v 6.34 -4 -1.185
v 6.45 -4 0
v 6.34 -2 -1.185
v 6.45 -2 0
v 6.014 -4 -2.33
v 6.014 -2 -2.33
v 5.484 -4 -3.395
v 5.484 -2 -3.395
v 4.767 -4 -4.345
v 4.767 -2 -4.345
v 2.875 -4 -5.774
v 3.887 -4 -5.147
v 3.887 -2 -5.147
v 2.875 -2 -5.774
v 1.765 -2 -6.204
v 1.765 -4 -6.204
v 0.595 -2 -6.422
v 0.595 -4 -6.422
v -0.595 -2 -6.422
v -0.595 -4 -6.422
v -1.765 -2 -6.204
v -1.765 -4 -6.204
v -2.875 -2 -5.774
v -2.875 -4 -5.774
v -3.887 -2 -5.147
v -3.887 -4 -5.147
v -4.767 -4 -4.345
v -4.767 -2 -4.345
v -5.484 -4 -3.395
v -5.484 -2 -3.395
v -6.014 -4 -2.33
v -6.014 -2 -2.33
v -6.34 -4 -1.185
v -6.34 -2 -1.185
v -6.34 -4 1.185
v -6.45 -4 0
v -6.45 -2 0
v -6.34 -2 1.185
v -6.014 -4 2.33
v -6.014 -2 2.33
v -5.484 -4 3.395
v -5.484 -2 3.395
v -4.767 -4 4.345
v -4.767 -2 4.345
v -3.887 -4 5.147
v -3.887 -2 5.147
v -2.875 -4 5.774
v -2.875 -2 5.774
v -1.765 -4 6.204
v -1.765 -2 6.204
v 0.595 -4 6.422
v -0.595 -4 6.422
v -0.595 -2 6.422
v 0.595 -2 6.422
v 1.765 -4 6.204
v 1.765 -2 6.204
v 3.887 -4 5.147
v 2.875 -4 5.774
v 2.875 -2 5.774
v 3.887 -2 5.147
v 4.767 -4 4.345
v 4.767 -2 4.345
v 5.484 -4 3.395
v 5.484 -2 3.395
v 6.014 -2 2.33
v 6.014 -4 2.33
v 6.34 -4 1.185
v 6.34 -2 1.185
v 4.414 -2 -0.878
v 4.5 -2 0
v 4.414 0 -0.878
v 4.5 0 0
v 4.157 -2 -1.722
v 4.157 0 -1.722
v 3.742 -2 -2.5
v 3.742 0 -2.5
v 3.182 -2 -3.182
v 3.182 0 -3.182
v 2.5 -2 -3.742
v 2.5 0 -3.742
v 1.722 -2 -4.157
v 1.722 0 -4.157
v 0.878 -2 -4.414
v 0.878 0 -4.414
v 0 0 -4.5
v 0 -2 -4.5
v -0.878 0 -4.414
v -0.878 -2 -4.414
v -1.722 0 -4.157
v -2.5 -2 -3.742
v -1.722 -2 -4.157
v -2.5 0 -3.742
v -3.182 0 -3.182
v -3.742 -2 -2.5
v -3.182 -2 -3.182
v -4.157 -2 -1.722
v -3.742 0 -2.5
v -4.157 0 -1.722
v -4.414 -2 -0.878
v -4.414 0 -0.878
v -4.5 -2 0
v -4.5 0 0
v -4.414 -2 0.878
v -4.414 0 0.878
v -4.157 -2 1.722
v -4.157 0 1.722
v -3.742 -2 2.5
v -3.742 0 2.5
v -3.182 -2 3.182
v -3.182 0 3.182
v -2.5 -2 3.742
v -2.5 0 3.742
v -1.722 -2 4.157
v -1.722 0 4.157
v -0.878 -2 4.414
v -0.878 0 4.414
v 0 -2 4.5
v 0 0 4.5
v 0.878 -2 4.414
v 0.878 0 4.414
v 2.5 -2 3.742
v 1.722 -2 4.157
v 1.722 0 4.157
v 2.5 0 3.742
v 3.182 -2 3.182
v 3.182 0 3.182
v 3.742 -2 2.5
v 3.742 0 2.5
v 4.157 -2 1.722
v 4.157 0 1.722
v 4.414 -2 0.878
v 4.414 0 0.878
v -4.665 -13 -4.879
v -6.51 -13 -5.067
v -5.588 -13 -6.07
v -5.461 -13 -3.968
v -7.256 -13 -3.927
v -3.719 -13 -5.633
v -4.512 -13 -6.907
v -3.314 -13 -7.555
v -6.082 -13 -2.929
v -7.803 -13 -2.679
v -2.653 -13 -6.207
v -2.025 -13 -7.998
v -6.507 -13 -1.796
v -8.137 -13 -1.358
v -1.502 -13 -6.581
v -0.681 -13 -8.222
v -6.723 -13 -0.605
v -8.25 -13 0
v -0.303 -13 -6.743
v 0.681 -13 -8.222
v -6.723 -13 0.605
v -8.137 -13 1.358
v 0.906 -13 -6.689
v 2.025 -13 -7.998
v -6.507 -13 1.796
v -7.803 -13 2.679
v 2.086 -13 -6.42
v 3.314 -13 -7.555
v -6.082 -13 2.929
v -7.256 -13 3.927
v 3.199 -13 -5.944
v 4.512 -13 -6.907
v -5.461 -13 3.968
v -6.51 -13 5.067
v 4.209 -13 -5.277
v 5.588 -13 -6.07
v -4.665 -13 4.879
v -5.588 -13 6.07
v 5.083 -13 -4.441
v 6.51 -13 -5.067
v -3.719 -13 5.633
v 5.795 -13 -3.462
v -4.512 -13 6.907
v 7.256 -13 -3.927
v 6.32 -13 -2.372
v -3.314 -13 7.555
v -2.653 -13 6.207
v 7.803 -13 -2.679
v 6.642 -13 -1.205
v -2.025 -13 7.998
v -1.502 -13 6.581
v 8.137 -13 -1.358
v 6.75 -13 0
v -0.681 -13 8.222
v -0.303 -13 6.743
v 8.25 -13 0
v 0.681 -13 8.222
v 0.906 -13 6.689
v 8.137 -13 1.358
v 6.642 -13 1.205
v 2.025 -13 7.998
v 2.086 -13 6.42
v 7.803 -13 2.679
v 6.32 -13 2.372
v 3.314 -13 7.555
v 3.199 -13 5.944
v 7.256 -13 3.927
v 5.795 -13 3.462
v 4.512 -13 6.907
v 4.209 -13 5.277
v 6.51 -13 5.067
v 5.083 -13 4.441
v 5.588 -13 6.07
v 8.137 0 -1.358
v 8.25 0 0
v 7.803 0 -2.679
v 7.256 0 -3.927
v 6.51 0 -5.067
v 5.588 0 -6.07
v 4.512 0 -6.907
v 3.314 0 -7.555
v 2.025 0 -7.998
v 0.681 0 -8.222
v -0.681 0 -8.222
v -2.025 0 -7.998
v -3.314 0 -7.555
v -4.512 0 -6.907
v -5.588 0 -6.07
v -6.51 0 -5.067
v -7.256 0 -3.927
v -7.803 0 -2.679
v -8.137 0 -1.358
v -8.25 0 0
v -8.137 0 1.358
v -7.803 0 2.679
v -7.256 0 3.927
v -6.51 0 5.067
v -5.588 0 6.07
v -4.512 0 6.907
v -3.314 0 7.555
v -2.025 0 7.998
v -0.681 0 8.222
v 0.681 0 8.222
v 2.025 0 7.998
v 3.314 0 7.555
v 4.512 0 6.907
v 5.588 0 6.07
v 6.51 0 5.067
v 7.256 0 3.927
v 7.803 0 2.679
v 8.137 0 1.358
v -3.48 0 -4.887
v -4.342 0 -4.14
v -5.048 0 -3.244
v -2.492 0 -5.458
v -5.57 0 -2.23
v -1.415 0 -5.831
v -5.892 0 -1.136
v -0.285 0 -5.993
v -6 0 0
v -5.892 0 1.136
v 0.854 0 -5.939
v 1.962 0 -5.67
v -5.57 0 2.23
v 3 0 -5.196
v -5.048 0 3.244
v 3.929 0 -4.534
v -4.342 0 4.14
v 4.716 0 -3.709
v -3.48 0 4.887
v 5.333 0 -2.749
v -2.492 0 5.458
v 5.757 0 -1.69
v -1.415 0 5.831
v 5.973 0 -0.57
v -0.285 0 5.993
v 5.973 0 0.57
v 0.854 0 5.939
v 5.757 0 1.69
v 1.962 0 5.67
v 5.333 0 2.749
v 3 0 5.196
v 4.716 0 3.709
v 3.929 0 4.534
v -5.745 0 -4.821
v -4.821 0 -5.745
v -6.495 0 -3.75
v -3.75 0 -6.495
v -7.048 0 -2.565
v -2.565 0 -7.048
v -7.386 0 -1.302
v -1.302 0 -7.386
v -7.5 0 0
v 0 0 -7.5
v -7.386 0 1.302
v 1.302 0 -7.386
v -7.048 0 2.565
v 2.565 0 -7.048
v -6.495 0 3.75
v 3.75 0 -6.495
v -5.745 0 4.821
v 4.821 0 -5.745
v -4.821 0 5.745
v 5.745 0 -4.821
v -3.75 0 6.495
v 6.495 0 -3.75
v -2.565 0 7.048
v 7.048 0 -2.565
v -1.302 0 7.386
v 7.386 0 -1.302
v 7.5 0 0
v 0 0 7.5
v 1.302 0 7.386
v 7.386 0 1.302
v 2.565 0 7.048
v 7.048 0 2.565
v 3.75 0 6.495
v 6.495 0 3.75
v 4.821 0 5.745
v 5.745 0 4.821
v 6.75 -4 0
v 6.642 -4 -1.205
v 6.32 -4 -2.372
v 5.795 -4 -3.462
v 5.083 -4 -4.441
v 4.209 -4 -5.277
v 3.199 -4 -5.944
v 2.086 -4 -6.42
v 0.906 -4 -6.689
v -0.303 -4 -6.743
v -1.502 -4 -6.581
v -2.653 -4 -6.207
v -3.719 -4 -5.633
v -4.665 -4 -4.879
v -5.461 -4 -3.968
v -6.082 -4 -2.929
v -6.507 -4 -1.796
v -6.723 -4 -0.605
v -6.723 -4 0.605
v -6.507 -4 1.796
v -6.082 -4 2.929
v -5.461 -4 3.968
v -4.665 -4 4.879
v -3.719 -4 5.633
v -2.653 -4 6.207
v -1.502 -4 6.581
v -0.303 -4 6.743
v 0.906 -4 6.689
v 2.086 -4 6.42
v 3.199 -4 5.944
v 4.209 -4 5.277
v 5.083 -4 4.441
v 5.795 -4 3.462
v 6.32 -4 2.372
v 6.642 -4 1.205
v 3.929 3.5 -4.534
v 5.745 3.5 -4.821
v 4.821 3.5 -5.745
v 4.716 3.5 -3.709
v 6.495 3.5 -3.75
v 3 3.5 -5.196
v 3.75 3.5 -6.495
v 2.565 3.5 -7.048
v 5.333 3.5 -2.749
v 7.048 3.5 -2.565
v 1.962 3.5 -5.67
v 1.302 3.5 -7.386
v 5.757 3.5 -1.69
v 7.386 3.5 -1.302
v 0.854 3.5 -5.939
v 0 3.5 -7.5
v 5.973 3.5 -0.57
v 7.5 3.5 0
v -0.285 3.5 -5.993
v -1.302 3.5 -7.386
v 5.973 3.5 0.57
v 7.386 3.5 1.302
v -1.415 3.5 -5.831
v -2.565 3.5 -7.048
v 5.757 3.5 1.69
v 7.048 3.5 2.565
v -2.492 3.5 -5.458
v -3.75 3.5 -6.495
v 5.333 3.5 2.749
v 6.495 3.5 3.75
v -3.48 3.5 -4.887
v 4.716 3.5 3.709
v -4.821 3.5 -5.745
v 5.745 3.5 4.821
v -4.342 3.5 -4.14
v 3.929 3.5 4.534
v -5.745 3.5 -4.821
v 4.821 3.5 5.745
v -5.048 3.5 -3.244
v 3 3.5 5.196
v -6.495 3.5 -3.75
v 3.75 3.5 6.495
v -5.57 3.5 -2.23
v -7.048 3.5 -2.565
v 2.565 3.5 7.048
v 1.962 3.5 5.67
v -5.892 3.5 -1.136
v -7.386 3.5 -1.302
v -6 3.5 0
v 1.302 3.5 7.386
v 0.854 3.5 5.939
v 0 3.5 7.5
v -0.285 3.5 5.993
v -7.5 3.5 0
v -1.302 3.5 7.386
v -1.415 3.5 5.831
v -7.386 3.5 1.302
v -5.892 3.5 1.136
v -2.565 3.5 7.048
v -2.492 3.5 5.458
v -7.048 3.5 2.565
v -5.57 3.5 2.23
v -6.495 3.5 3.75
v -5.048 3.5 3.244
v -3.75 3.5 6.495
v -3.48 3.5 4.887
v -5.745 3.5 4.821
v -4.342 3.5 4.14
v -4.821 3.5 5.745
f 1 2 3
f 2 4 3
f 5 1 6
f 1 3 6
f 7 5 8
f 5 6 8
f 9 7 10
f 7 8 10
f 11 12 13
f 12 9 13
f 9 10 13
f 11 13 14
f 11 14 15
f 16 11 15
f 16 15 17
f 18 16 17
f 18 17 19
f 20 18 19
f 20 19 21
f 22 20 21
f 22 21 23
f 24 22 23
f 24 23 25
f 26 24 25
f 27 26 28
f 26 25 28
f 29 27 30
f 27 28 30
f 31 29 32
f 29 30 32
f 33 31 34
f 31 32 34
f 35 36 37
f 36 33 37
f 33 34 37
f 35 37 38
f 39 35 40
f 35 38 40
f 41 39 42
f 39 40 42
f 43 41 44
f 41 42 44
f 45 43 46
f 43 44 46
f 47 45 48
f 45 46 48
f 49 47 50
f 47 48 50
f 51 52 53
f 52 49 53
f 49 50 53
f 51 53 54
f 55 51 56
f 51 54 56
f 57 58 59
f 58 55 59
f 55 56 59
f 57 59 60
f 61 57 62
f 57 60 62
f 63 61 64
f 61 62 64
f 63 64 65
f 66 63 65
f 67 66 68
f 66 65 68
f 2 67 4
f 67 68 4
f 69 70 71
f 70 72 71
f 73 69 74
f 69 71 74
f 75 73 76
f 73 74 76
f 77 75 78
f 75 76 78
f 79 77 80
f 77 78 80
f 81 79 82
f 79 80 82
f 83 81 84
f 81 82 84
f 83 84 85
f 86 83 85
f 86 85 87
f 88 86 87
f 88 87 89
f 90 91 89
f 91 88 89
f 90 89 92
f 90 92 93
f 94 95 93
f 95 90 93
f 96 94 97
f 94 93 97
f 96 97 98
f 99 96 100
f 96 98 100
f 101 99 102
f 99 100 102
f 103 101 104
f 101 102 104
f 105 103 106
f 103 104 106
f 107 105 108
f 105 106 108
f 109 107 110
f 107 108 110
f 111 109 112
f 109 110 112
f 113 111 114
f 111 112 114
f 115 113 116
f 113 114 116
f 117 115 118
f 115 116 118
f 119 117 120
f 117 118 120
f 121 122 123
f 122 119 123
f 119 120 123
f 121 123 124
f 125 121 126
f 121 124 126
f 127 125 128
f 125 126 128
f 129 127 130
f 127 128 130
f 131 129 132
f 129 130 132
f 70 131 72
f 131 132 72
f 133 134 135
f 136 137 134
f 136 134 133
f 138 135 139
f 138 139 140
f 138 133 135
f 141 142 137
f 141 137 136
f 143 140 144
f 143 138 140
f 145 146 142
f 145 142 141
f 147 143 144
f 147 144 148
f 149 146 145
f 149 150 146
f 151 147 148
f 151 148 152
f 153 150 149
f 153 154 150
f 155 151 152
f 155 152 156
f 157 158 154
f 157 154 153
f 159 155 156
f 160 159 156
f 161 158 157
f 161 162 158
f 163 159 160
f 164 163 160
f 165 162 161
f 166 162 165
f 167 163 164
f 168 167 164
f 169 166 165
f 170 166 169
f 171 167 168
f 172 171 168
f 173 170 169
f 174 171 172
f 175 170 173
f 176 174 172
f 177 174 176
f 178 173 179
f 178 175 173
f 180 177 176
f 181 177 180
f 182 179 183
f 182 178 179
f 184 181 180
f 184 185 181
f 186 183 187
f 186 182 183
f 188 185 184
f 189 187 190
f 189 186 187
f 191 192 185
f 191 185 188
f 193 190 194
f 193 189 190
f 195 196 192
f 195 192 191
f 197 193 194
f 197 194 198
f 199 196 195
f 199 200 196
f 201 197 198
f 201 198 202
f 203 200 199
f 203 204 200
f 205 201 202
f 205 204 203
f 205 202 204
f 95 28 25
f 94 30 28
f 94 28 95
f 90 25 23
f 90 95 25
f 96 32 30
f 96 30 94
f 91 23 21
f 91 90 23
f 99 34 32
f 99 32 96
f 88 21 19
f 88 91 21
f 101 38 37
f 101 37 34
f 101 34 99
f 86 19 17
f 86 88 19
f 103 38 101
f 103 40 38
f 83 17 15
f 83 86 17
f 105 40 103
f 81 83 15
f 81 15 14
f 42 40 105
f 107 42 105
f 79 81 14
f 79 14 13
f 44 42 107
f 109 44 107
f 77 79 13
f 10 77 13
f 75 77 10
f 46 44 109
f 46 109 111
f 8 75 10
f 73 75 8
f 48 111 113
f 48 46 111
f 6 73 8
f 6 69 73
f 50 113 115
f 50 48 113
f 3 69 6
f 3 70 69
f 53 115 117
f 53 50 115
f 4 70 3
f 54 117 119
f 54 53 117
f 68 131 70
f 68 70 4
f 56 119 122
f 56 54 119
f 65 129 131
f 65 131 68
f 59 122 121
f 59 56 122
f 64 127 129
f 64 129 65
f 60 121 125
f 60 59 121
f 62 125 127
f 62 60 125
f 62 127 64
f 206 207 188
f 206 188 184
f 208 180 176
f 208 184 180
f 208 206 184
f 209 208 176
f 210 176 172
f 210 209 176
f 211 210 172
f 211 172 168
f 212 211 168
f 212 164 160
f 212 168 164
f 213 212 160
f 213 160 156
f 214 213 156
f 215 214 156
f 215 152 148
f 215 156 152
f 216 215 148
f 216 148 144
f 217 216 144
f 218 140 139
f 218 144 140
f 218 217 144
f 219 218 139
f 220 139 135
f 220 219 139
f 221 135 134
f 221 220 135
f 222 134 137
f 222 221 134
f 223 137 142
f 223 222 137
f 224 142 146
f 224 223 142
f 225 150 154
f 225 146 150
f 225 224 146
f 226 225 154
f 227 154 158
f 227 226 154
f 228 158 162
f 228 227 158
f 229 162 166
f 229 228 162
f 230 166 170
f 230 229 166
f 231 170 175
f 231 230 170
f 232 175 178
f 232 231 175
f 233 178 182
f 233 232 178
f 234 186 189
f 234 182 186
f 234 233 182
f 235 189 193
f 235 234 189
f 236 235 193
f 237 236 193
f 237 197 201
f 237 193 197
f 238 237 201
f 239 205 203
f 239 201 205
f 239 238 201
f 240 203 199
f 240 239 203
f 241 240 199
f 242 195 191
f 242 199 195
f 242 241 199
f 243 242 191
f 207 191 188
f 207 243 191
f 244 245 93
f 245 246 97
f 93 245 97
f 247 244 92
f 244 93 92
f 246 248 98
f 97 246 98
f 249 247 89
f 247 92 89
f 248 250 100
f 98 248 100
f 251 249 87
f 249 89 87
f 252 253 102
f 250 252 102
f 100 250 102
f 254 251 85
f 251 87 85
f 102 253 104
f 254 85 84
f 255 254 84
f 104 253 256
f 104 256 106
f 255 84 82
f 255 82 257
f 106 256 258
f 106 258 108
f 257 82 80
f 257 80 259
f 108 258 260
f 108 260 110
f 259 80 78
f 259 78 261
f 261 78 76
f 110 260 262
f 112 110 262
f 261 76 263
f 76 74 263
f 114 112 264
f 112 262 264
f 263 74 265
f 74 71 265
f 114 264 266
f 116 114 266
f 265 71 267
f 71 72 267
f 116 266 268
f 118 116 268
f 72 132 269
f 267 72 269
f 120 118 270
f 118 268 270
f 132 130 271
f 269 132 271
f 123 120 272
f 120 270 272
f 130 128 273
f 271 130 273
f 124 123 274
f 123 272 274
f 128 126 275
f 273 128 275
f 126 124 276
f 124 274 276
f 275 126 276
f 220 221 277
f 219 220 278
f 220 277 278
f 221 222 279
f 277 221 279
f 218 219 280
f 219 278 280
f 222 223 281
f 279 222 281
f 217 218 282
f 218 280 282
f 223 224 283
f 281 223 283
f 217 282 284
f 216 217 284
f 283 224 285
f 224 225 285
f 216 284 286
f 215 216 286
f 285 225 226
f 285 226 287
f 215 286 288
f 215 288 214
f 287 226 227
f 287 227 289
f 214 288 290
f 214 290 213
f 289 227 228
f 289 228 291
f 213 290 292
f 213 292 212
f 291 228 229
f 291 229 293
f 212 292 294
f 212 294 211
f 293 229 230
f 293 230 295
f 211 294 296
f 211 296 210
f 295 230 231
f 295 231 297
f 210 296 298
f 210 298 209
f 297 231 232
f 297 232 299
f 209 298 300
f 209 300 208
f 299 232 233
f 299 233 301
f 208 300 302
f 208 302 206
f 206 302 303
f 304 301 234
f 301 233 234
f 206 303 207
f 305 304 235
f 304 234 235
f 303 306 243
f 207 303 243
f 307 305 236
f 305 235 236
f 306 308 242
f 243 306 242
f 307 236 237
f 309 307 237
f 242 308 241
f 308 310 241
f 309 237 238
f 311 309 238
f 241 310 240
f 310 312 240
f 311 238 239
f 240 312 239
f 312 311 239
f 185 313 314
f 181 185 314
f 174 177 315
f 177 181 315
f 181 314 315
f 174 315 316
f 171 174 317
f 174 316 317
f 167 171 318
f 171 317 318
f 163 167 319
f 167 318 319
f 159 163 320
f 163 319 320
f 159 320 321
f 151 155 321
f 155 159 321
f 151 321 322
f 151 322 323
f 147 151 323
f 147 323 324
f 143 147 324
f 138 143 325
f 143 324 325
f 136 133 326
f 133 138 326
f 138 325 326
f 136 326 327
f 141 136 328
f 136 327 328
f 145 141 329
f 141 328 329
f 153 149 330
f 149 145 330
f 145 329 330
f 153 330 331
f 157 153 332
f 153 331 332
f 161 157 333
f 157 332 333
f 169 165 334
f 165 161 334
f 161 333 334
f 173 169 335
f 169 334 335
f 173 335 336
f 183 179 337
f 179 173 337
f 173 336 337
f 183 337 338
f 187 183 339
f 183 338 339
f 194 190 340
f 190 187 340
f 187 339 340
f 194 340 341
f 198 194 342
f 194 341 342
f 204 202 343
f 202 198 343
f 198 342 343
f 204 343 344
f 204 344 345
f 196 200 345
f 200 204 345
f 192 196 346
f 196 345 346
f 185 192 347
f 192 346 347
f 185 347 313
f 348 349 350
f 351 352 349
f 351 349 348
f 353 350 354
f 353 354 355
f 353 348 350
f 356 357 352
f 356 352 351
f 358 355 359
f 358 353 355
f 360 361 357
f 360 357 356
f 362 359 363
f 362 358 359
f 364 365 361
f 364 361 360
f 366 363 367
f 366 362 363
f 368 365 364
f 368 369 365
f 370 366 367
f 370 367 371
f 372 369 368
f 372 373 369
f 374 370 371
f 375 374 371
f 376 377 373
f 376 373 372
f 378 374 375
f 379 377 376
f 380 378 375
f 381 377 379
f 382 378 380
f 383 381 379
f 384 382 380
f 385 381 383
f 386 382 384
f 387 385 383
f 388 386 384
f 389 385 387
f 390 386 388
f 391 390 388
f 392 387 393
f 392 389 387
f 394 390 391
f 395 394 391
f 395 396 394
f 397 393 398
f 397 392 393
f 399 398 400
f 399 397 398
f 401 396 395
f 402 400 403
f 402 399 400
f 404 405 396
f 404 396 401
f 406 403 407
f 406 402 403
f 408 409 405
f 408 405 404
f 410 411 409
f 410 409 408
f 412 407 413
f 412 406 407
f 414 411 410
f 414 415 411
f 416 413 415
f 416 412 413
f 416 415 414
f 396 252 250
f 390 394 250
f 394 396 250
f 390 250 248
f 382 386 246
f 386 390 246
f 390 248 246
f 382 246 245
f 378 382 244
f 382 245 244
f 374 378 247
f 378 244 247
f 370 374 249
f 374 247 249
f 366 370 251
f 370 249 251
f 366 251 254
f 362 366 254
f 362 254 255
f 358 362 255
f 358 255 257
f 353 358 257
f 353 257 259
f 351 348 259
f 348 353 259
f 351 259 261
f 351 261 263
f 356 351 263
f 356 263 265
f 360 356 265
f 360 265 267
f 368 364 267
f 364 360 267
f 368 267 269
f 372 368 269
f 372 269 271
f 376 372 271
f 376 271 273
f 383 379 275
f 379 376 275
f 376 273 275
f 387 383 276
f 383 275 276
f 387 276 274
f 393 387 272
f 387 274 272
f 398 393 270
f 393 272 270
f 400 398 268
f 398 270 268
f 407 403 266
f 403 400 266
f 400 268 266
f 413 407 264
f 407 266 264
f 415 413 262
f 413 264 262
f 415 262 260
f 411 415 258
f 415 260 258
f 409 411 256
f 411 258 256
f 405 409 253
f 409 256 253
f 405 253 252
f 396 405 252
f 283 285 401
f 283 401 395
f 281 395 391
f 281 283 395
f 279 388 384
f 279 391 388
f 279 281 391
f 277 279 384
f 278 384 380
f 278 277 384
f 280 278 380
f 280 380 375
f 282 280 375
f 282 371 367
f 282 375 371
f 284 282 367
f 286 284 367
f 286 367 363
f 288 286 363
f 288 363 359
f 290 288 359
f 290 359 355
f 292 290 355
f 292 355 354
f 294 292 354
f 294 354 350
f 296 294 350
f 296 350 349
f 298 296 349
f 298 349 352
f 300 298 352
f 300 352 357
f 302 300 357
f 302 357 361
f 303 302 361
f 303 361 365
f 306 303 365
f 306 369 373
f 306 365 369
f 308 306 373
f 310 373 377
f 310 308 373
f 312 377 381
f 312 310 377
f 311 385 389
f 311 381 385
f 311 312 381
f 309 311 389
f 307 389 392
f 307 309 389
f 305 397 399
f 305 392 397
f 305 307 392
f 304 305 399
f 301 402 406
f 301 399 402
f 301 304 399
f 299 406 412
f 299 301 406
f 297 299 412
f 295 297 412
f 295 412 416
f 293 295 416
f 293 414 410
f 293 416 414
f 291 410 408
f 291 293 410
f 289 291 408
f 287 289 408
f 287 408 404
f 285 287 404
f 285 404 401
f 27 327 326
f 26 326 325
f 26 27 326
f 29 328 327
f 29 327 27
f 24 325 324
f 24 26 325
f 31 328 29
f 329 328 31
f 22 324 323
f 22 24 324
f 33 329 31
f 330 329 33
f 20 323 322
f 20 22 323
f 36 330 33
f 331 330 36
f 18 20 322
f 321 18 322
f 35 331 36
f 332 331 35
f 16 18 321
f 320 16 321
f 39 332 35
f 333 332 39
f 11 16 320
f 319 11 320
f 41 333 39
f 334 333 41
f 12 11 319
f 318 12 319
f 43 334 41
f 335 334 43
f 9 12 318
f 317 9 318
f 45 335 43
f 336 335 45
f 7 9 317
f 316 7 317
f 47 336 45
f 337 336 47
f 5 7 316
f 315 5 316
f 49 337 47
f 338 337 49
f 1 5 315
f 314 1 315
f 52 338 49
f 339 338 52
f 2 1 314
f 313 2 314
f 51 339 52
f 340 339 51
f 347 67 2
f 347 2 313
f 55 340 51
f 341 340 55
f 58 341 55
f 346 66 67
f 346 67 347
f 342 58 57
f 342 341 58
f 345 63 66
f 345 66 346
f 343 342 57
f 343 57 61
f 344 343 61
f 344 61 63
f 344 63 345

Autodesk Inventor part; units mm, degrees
ref_plane "YZ Plane" through (0, 0, 0) normal (1, 0, 0) x (0, 1, 0)
ref_plane "XZ Plane" through (0, 0, 0) normal (0, 1, 0) x (-1, 0, 0)
ref_plane "XY Plane" through (0, 0, 0) normal (0, 0, 1) x (1, 0, 0)
sketch "Sketch1" plane through (0, 0, 0) normal (0, 1, 0) x (-1, 0, 0)
  circle A0 centre (0, 0) radius 6
  circle A1 centre (0, 0) radius 7.5
  dimension "d0" = 12
  dimension "d1" = 15
extrude "Extrusion1" add sketch "Sketch1" along normal blind 3.5
sketch "Sketch2" plane through (0, 0, 0) normal (0, -1, 0) x (1, 0, 0)
  circle A0 centre (0, 0) radius 4.5
  circle A1 centre (0, 0) radius 8.25
  dimension "d4" = 9
  dimension "d5" = 16.5
extrude "Extrusion2" add sketch "Sketch2" along normal blind 2
sketch "Sketch3" plane through (0, -2, 0) normal (0, -1, 0) x (1, 0, 0)
  circle A0 centre (0, 0) radius 6.75
  circle A1 centre (0, 0) radius 8.25 projected
  circle A2 centre (0, 0) radius 8.25
  dimension "d8" = 13.5
  dimension "d9" = 16.5
extrude "Extrusion3" add sketch "Sketch3" along normal blind 11
sketch "Sketch4" plane through (0, -13, 0) normal (0, -1, 0) x (1, 0, 0)
  point P0 (0, 0)
sketch "Sketch9" plane through (0, -2, 0) normal (0, -1, 0) x (1, 0, 0)
  circle A0 centre (0, 0) radius 6.45
  circle A1 centre (0, 0) radius 6.75
  dimension "d54" = 12.9
  dimension "d55" = 13.5
extrude "Extrusion4" add sketch "Sketch9" along normal blind 2
thread "Thread4" size "M12x0.5" class "6H" standard "ISO Metric profile" full length
thread "Thread5" size "M14x0.5" class "6H" standard "ISO Metric profile" length 9
equation "\"d25\" = 60deg"
equation "\"Sketch5_Pitch\" = 0.5"
equation "\"d43\" = 60deg"
equation "\"Sketch7_Pitch\" = 0.5"
properties part number "holder2"
